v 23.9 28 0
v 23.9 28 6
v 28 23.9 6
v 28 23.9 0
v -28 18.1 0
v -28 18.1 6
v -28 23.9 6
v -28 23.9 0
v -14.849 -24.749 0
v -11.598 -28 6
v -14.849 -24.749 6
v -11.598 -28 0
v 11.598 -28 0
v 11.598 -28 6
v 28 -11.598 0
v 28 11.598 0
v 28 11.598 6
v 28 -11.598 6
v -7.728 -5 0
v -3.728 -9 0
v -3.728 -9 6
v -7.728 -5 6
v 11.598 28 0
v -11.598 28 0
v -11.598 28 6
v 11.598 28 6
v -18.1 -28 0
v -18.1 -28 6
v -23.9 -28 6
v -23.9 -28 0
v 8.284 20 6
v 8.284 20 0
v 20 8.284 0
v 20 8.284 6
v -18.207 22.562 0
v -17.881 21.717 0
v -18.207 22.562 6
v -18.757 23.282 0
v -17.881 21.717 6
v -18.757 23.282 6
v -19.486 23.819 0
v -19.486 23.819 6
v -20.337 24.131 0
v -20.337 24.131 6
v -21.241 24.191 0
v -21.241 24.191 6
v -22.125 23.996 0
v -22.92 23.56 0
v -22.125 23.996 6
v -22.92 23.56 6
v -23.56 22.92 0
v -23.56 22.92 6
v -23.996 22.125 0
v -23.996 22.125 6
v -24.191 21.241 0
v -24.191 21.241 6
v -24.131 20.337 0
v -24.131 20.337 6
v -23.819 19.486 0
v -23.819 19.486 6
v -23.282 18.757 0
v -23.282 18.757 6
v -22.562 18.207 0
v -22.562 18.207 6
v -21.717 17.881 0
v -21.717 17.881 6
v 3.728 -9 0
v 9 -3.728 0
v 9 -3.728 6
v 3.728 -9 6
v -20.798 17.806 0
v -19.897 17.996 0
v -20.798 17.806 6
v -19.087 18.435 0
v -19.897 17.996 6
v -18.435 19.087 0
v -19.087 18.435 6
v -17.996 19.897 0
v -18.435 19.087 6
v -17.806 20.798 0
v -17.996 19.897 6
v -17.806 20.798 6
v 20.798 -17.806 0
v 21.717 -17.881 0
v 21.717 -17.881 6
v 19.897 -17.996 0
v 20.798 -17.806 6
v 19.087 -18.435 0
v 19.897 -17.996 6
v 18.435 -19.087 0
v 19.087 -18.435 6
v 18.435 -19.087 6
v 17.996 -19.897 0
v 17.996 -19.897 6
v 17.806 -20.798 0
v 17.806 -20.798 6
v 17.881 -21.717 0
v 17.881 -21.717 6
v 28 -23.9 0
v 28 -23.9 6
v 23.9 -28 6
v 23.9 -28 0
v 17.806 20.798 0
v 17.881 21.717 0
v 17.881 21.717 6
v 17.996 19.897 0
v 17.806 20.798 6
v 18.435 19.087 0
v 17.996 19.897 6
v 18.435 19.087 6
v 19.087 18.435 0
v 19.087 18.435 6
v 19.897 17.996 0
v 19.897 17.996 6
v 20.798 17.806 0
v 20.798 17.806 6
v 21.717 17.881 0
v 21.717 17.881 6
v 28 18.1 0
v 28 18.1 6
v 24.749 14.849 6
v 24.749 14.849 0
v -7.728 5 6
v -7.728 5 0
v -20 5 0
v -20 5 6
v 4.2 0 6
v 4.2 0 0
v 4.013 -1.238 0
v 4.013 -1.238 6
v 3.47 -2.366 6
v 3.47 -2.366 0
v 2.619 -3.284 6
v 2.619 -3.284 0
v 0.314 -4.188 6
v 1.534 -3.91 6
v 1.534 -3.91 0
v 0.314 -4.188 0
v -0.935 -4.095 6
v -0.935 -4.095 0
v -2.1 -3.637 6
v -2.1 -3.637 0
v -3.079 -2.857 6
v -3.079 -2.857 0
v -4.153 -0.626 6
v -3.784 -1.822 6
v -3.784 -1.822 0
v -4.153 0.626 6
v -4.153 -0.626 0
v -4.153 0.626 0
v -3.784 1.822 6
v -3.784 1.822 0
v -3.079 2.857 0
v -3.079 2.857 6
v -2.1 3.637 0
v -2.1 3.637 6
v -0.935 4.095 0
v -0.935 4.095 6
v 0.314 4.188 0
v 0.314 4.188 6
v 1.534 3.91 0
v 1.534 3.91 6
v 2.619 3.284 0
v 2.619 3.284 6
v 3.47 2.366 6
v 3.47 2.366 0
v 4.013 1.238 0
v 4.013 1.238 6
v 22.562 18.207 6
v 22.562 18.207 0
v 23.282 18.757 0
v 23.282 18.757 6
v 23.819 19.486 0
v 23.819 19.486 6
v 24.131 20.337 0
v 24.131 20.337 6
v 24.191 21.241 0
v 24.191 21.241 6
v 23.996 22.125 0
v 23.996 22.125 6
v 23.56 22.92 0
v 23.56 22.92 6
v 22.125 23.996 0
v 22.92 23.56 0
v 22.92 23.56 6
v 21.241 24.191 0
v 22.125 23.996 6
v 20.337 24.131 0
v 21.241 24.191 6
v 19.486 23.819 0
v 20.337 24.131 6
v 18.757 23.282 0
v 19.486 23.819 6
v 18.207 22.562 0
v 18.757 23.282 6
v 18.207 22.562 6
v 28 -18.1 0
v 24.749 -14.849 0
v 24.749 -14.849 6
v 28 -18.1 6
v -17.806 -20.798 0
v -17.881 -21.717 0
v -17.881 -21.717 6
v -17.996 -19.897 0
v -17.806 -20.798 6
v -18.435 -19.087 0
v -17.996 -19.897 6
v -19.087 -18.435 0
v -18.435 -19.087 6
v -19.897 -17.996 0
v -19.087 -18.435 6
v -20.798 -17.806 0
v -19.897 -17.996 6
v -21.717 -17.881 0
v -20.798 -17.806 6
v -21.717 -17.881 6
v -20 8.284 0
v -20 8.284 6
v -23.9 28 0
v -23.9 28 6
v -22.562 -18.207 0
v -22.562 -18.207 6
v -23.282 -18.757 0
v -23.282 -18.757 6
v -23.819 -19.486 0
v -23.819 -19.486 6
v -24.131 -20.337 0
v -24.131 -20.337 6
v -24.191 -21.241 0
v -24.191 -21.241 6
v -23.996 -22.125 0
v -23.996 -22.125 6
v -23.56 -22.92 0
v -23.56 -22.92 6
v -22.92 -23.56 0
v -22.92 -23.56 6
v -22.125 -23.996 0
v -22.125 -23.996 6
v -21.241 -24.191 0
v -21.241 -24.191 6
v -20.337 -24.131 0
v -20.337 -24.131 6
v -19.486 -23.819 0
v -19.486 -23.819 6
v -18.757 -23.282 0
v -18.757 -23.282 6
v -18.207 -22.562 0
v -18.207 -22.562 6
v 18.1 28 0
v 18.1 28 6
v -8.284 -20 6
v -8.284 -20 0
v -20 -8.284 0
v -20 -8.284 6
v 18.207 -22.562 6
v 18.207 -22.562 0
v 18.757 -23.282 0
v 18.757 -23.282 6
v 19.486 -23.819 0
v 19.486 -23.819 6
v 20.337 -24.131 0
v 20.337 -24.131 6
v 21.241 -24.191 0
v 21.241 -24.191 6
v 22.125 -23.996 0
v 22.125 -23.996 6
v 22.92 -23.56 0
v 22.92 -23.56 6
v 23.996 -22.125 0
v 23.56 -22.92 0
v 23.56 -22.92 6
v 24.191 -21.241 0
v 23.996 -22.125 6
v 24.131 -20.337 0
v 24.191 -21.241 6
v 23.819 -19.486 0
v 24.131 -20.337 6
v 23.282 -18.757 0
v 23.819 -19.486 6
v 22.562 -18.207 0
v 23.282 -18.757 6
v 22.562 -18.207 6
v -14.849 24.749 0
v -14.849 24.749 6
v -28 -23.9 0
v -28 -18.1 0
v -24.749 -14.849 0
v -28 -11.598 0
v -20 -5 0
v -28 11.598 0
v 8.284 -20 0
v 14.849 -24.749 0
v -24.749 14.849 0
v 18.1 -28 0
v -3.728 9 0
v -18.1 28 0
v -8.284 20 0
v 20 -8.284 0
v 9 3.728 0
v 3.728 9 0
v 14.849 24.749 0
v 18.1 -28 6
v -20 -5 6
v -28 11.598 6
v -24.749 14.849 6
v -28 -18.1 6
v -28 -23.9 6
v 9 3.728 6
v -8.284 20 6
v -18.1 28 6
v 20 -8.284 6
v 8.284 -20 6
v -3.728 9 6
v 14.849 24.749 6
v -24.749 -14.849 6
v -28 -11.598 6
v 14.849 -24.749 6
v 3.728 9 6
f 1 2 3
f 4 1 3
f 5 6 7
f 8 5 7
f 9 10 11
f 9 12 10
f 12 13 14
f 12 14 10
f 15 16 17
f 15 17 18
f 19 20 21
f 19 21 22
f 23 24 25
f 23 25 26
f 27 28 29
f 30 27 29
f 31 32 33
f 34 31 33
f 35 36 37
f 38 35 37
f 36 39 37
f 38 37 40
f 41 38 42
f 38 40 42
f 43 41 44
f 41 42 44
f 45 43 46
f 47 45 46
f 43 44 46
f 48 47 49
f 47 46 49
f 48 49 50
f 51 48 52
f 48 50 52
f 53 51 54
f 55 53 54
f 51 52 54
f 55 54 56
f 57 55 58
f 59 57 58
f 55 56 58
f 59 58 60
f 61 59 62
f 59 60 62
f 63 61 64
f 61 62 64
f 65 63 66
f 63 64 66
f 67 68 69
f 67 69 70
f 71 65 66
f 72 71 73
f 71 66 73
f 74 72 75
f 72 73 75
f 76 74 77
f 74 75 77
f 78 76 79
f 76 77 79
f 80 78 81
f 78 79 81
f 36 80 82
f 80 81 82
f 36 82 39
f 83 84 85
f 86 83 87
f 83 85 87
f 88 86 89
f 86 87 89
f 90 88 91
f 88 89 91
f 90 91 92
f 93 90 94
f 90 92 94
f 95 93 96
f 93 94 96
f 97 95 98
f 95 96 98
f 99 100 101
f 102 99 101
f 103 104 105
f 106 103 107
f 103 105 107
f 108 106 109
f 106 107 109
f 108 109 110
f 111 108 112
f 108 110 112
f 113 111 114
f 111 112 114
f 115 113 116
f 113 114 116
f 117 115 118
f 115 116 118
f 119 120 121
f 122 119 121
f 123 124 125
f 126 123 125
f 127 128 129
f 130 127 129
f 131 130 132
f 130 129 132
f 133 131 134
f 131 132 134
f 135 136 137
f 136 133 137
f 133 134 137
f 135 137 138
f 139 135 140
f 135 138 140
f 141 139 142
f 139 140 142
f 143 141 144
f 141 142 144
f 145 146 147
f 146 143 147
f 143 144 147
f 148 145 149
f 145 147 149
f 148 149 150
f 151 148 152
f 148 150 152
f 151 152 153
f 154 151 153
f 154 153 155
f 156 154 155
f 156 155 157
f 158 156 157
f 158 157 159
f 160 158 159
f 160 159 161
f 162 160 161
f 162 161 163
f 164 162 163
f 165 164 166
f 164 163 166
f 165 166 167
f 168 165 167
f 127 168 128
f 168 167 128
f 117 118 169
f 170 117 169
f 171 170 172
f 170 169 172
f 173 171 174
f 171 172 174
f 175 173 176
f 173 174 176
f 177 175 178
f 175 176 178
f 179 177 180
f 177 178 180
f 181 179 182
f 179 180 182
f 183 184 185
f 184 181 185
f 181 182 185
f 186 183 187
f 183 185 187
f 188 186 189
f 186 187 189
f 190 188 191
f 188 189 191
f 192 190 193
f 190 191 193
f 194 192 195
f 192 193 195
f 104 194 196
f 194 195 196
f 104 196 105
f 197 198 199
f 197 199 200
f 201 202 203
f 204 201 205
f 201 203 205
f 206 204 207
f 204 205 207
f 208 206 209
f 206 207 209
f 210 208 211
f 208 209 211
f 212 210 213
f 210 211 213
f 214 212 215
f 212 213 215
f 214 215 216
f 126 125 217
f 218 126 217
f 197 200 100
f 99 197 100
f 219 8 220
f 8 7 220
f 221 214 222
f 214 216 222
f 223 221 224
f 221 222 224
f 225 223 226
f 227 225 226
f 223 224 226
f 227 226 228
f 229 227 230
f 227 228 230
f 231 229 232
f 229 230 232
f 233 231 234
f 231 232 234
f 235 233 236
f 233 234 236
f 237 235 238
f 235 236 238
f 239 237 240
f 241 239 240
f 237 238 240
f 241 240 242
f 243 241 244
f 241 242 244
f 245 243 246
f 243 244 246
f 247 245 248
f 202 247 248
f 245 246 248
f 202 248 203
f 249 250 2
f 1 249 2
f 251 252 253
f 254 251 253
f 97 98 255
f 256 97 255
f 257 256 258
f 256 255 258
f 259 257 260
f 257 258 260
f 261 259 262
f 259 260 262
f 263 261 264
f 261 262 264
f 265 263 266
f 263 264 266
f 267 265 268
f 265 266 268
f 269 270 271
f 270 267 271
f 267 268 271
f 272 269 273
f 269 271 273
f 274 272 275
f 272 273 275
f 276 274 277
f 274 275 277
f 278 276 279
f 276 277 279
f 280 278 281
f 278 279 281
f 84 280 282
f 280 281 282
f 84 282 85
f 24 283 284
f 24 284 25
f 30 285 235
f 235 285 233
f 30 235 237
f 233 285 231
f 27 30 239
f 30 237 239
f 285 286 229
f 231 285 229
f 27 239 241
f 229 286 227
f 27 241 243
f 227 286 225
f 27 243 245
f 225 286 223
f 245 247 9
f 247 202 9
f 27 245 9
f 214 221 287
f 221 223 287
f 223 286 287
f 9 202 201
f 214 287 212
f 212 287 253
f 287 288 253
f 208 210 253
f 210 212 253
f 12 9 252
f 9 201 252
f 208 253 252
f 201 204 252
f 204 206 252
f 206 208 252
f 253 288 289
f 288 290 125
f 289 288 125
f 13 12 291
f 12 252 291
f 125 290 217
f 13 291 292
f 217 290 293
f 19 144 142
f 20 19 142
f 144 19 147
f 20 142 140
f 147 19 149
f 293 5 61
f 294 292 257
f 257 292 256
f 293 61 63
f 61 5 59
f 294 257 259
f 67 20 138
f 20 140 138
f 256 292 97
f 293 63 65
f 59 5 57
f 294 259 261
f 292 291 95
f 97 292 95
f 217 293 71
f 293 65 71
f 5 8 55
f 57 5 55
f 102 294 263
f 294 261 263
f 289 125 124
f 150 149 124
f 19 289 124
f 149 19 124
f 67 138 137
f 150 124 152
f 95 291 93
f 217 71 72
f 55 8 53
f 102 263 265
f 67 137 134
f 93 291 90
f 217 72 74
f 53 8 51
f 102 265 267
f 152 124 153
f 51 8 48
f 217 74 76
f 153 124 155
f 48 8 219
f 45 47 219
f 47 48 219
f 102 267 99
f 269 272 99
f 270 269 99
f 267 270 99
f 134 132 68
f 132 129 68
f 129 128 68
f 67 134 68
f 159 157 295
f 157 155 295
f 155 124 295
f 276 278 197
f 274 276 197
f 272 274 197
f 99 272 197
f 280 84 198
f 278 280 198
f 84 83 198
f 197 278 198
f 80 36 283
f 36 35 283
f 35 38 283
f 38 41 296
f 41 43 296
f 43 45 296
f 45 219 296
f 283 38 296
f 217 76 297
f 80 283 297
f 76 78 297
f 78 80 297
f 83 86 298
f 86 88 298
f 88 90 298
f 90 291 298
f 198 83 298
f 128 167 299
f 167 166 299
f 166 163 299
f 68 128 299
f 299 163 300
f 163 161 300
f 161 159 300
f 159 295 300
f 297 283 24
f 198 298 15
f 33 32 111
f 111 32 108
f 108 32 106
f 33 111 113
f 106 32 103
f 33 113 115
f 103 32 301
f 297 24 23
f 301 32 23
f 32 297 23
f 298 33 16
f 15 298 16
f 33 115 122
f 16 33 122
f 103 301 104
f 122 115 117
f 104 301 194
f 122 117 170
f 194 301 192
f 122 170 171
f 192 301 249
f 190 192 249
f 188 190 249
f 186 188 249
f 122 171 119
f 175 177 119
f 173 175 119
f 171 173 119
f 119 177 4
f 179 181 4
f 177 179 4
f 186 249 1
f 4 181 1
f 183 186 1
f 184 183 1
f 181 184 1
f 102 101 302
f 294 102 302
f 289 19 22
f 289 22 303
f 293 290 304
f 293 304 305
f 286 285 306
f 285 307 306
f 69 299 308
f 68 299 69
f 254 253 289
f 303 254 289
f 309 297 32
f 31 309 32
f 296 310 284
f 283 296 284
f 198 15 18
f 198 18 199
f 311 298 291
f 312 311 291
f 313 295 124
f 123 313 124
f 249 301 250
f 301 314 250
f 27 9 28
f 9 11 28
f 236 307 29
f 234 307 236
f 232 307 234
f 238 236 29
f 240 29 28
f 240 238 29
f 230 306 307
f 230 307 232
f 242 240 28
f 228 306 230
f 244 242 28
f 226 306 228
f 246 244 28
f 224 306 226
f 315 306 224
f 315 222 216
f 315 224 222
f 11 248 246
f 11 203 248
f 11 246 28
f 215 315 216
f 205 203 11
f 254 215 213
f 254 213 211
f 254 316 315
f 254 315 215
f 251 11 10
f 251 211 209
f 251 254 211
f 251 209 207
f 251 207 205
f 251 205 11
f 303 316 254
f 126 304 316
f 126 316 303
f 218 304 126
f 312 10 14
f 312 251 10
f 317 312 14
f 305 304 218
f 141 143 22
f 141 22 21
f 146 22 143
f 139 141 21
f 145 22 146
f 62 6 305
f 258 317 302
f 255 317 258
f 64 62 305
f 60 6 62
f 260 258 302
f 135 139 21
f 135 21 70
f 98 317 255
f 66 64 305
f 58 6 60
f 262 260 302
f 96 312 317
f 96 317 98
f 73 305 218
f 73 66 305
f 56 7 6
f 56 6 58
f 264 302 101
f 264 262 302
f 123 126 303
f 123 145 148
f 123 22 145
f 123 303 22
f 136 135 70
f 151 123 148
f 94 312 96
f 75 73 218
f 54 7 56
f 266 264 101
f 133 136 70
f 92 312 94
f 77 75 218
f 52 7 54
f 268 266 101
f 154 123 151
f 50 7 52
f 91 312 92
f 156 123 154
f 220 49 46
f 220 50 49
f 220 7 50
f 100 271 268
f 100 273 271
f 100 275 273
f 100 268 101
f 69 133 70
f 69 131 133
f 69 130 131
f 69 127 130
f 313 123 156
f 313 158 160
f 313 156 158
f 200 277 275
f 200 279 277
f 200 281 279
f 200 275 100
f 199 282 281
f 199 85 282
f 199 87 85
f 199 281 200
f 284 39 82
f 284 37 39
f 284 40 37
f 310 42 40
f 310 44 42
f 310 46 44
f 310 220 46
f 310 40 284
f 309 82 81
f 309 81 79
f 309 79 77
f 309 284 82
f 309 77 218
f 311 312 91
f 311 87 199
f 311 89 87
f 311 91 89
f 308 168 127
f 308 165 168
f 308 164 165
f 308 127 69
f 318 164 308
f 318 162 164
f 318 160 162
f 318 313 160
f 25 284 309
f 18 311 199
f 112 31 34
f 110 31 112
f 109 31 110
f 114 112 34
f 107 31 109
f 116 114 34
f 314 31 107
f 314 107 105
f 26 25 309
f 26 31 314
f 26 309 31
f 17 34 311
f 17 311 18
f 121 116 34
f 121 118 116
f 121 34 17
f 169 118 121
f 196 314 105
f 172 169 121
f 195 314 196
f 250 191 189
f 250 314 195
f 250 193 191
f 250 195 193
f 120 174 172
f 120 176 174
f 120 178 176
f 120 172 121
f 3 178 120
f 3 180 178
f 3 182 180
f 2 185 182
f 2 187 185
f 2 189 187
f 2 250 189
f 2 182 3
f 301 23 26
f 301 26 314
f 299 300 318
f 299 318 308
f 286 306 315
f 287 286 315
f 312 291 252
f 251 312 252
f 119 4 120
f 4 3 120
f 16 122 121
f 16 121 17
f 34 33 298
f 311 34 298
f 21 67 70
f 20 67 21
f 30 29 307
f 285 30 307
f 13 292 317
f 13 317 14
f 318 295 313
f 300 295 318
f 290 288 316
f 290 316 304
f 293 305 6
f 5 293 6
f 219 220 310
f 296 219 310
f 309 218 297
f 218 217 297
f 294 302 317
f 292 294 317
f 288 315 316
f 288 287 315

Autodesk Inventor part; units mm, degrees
ref_plane "YZ Plane" through (0, 0, 0) normal (1, 0, 0) x (0, 1, 0)
ref_plane "XZ Plane" through (0, 0, 0) normal (0, 1, 0) x (-1, 0, 0)
ref_plane "XY Plane" through (0, 0, 0) normal (0, 0, 1) x (1, 0, 0)
sketch "Sketch1" plane through (0, 0, 0) normal (0, 0, 1) x (1, 0, 0)
  circle A0 centre (0, 0) radius 8 construction
  circle A1 centre (0, 0) radius 16 construction
  line L0 (20, -8.2843) -> (8.2843, -20)
  line L1 (8.2843, -20) -> (-8.2843, -20)
  line L2 (-8.2843, -20) -> (-20, -8.2843)
  line L3 (-20, 8.2843) -> (-8.2843, 20)
  line L4 (-8.2843, 20) -> (8.2843, 20)
  line L5 (8.2843, 20) -> (20, 8.2843)
  line L6 (20, 8.2843) -> (20, -8.2843)
  line L7 (-7.7279, 5) -> (-20, 5)
  line L8 (-7.7279, -5) -> (-20, -5)
  circle A2 centre (0, 0) radius 4.2
  line L9 (-20, -8.2843) -> (-20, -5)
  line L10 (-20, 5) -> (-20, 8.2843)
  line L11 (28, -11.598) -> (11.598, -28)
  line L12 (11.598, -28) -> (-11.598, -28)
  line L13 (-11.598, -28) -> (-28, -11.598)
  line L14 (-28, -11.598) -> (-28, 11.598)
  line L15 (-28, 11.598) -> (-11.598, 28)
  line L16 (-11.598, 28) -> (11.598, 28)
  line L17 (11.598, 28) -> (28, 11.598)
  line L18 (28, 11.598) -> (28, -11.598)
  line L19 (9, -3.7279) -> (3.7279, -9)
  line L20 (3.7279, -9) -> (-3.7279, -9)
  line L21 (-3.7279, 9) -> (3.7279, 9)
  line L22 (3.7279, 9) -> (9, 3.7279)
  line L23 (9, 3.7279) -> (9, -3.7279)
  line L24 (-20, 5) -> (-20, -5) construction
  line L25 (-3.7279, 9) -> (-7.7279, 5)
  line L26 (-3.7279, -9) -> (-7.7279, -5)
  point P0 (-20, 0)
  dimension "d1" = 16
  dimension "d2" = 32
  dimension "d5" = 8.4
  dimension "d6" = 40
  dimension "d7" = 8
  dimension "d8" = 10
  dimension "d10" = 18
extrude "Extrusion1" add sketch "Sketch1" along normal blind 6
sketch "Sketch2" plane through (0, 0, 6) normal (0, 0, 1) x (1, 0, 0)
  circle A0 centre (0, 0) radius 4.2 projected
  line L0 (11.598, 28) -> (-11.598, 28) projected
  line L1 (-11.598, 28) -> (-28, 11.598) projected
  line L2 (-28, 11.598) -> (-28, -11.598) projected
  line L3 (-28, -11.598) -> (-11.598, -28) projected
  line L4 (-11.598, -28) -> (11.598, -28) projected
  line L5 (-24.7487, 14.8492) -> (-28, 18.1005)
  line L6 (-28, 18.1005) -> (-28, 23.8995)
  line L7 (-28, 23.8995) -> (-23.8995, 28)
  line L8 (-23.8995, 28) -> (-18.1005, 28)
  line L9 (-18.1005, 28) -> (-14.8492, 24.7487)
  line L10 (-28, 21) -> (-21, 21) construction
  line L11 (-21, 28) -> (-21, 21) construction
  circle A1 centre (-21, 21) radius 3.2
  line L12 (-24.7487, 14.8492) -> (-14.8492, 24.7487)
  line L13 (-14.8492, -24.7487) -> (-18.1005, -28)
  line L14 (-18.1005, -28) -> (-23.8995, -28)
  line L15 (-23.8995, -28) -> (-28, -23.8995)
  line L16 (-28, -23.8995) -> (-28, -18.1005)
  line L17 (-28, -18.1005) -> (-24.7487, -14.8492)
  circle A2 centre (-21, -21) radius 3.2
  line L18 (-14.8492, -24.7487) -> (-24.7487, -14.8492)
  line L19 (24.7487, -14.8492) -> (28, -18.1005)
  line L20 (28, -18.1005) -> (28, -23.8995)
  line L21 (28, -23.8995) -> (23.8995, -28)
  line L22 (23.8995, -28) -> (18.1005, -28)
  line L23 (18.1005, -28) -> (14.8492, -24.7487)
  circle A3 centre (21, -21) radius 3.2
  line L24 (24.7487, -14.8492) -> (14.8492, -24.7487)
  line L25 (14.8492, 24.7487) -> (18.1005, 28)
  line L26 (18.1005, 28) -> (23.8995, 28)
  line L27 (23.8995, 28) -> (28, 23.8995)
  line L28 (28, 23.8995) -> (28, 18.1005)
  line L29 (28, 18.1005) -> (24.7487, 14.8492)
  circle A4 centre (21, 21) radius 3.2
  line L30 (14.8492, 24.7487) -> (24.7487, 14.8492)
  circle A5 centre (-21, 21) radius 6 construction
  point P0 (-19.799, 19.799)
  point P1 (-21, -28)
  point P2 (-28, -21)
  point P3 (28, -21)
  point P4 (21, -28)
  point P5 (21, 28)
  point P6 (28, 21)
  dimension "d13" = 14
  dimension "d14" = 7
  dimension "d15" = 6.4
  dimension "d18" = 360
  dimension "d22" = 12
extrude "Extrusion2" add sketch "Sketch2" against normal blind 6 contours L3 A2 L13 L14 L15 L16 L17 | L5 L6 L7 L8 L9 L1 A1 | L19 L20 L21 L22 L23 L24 A3 | L25 L26 L27 L28 L29 L30 A4
sketch "Sketch3" plane through (0, 0, 6) normal (0, 0, 1) x (1, 0, 0)
  line L0 (-17.8813, 21.7167) -> (-21.7167, 17.8813) projected
  arc A0 (-17.8813, 21.7167) -> (-21.7167, 17.8813) centre (-21, 21) ccw projected
  line L1 (-21.7167, -17.8813) -> (-17.8813, -21.7167) projected
  arc A1 (-21.7167, -17.8813) -> (-17.8813, -21.7167) centre (-21, -21) ccw projected
  arc A2 (17.8813, -21.7167) -> (21.7167, -17.8813) centre (21, -21) ccw projected
  line L2 (17.8813, -21.7167) -> (21.7167, -17.8813) projected
  arc A3 (21.7167, 17.8813) -> (17.8813, 21.7167) centre (21, 21) ccw projected
  line L3 (21.7167, 17.8813) -> (17.8813, 21.7167) projected
  circle A4 centre (-21, -21) radius 3.2
  circle A5 centre (-21, 21) radius 3.2
  circle A6 centre (21, 21) radius 3.2
  circle A7 centre (21, -21) radius 3.2
extrude "Extrusion3" cut sketch "Sketch3" against normal through all contours A5 L0 | A4 L1 | A7 L2 | A6 L3
properties part number "x_iddler_belt_bearing_mount"
